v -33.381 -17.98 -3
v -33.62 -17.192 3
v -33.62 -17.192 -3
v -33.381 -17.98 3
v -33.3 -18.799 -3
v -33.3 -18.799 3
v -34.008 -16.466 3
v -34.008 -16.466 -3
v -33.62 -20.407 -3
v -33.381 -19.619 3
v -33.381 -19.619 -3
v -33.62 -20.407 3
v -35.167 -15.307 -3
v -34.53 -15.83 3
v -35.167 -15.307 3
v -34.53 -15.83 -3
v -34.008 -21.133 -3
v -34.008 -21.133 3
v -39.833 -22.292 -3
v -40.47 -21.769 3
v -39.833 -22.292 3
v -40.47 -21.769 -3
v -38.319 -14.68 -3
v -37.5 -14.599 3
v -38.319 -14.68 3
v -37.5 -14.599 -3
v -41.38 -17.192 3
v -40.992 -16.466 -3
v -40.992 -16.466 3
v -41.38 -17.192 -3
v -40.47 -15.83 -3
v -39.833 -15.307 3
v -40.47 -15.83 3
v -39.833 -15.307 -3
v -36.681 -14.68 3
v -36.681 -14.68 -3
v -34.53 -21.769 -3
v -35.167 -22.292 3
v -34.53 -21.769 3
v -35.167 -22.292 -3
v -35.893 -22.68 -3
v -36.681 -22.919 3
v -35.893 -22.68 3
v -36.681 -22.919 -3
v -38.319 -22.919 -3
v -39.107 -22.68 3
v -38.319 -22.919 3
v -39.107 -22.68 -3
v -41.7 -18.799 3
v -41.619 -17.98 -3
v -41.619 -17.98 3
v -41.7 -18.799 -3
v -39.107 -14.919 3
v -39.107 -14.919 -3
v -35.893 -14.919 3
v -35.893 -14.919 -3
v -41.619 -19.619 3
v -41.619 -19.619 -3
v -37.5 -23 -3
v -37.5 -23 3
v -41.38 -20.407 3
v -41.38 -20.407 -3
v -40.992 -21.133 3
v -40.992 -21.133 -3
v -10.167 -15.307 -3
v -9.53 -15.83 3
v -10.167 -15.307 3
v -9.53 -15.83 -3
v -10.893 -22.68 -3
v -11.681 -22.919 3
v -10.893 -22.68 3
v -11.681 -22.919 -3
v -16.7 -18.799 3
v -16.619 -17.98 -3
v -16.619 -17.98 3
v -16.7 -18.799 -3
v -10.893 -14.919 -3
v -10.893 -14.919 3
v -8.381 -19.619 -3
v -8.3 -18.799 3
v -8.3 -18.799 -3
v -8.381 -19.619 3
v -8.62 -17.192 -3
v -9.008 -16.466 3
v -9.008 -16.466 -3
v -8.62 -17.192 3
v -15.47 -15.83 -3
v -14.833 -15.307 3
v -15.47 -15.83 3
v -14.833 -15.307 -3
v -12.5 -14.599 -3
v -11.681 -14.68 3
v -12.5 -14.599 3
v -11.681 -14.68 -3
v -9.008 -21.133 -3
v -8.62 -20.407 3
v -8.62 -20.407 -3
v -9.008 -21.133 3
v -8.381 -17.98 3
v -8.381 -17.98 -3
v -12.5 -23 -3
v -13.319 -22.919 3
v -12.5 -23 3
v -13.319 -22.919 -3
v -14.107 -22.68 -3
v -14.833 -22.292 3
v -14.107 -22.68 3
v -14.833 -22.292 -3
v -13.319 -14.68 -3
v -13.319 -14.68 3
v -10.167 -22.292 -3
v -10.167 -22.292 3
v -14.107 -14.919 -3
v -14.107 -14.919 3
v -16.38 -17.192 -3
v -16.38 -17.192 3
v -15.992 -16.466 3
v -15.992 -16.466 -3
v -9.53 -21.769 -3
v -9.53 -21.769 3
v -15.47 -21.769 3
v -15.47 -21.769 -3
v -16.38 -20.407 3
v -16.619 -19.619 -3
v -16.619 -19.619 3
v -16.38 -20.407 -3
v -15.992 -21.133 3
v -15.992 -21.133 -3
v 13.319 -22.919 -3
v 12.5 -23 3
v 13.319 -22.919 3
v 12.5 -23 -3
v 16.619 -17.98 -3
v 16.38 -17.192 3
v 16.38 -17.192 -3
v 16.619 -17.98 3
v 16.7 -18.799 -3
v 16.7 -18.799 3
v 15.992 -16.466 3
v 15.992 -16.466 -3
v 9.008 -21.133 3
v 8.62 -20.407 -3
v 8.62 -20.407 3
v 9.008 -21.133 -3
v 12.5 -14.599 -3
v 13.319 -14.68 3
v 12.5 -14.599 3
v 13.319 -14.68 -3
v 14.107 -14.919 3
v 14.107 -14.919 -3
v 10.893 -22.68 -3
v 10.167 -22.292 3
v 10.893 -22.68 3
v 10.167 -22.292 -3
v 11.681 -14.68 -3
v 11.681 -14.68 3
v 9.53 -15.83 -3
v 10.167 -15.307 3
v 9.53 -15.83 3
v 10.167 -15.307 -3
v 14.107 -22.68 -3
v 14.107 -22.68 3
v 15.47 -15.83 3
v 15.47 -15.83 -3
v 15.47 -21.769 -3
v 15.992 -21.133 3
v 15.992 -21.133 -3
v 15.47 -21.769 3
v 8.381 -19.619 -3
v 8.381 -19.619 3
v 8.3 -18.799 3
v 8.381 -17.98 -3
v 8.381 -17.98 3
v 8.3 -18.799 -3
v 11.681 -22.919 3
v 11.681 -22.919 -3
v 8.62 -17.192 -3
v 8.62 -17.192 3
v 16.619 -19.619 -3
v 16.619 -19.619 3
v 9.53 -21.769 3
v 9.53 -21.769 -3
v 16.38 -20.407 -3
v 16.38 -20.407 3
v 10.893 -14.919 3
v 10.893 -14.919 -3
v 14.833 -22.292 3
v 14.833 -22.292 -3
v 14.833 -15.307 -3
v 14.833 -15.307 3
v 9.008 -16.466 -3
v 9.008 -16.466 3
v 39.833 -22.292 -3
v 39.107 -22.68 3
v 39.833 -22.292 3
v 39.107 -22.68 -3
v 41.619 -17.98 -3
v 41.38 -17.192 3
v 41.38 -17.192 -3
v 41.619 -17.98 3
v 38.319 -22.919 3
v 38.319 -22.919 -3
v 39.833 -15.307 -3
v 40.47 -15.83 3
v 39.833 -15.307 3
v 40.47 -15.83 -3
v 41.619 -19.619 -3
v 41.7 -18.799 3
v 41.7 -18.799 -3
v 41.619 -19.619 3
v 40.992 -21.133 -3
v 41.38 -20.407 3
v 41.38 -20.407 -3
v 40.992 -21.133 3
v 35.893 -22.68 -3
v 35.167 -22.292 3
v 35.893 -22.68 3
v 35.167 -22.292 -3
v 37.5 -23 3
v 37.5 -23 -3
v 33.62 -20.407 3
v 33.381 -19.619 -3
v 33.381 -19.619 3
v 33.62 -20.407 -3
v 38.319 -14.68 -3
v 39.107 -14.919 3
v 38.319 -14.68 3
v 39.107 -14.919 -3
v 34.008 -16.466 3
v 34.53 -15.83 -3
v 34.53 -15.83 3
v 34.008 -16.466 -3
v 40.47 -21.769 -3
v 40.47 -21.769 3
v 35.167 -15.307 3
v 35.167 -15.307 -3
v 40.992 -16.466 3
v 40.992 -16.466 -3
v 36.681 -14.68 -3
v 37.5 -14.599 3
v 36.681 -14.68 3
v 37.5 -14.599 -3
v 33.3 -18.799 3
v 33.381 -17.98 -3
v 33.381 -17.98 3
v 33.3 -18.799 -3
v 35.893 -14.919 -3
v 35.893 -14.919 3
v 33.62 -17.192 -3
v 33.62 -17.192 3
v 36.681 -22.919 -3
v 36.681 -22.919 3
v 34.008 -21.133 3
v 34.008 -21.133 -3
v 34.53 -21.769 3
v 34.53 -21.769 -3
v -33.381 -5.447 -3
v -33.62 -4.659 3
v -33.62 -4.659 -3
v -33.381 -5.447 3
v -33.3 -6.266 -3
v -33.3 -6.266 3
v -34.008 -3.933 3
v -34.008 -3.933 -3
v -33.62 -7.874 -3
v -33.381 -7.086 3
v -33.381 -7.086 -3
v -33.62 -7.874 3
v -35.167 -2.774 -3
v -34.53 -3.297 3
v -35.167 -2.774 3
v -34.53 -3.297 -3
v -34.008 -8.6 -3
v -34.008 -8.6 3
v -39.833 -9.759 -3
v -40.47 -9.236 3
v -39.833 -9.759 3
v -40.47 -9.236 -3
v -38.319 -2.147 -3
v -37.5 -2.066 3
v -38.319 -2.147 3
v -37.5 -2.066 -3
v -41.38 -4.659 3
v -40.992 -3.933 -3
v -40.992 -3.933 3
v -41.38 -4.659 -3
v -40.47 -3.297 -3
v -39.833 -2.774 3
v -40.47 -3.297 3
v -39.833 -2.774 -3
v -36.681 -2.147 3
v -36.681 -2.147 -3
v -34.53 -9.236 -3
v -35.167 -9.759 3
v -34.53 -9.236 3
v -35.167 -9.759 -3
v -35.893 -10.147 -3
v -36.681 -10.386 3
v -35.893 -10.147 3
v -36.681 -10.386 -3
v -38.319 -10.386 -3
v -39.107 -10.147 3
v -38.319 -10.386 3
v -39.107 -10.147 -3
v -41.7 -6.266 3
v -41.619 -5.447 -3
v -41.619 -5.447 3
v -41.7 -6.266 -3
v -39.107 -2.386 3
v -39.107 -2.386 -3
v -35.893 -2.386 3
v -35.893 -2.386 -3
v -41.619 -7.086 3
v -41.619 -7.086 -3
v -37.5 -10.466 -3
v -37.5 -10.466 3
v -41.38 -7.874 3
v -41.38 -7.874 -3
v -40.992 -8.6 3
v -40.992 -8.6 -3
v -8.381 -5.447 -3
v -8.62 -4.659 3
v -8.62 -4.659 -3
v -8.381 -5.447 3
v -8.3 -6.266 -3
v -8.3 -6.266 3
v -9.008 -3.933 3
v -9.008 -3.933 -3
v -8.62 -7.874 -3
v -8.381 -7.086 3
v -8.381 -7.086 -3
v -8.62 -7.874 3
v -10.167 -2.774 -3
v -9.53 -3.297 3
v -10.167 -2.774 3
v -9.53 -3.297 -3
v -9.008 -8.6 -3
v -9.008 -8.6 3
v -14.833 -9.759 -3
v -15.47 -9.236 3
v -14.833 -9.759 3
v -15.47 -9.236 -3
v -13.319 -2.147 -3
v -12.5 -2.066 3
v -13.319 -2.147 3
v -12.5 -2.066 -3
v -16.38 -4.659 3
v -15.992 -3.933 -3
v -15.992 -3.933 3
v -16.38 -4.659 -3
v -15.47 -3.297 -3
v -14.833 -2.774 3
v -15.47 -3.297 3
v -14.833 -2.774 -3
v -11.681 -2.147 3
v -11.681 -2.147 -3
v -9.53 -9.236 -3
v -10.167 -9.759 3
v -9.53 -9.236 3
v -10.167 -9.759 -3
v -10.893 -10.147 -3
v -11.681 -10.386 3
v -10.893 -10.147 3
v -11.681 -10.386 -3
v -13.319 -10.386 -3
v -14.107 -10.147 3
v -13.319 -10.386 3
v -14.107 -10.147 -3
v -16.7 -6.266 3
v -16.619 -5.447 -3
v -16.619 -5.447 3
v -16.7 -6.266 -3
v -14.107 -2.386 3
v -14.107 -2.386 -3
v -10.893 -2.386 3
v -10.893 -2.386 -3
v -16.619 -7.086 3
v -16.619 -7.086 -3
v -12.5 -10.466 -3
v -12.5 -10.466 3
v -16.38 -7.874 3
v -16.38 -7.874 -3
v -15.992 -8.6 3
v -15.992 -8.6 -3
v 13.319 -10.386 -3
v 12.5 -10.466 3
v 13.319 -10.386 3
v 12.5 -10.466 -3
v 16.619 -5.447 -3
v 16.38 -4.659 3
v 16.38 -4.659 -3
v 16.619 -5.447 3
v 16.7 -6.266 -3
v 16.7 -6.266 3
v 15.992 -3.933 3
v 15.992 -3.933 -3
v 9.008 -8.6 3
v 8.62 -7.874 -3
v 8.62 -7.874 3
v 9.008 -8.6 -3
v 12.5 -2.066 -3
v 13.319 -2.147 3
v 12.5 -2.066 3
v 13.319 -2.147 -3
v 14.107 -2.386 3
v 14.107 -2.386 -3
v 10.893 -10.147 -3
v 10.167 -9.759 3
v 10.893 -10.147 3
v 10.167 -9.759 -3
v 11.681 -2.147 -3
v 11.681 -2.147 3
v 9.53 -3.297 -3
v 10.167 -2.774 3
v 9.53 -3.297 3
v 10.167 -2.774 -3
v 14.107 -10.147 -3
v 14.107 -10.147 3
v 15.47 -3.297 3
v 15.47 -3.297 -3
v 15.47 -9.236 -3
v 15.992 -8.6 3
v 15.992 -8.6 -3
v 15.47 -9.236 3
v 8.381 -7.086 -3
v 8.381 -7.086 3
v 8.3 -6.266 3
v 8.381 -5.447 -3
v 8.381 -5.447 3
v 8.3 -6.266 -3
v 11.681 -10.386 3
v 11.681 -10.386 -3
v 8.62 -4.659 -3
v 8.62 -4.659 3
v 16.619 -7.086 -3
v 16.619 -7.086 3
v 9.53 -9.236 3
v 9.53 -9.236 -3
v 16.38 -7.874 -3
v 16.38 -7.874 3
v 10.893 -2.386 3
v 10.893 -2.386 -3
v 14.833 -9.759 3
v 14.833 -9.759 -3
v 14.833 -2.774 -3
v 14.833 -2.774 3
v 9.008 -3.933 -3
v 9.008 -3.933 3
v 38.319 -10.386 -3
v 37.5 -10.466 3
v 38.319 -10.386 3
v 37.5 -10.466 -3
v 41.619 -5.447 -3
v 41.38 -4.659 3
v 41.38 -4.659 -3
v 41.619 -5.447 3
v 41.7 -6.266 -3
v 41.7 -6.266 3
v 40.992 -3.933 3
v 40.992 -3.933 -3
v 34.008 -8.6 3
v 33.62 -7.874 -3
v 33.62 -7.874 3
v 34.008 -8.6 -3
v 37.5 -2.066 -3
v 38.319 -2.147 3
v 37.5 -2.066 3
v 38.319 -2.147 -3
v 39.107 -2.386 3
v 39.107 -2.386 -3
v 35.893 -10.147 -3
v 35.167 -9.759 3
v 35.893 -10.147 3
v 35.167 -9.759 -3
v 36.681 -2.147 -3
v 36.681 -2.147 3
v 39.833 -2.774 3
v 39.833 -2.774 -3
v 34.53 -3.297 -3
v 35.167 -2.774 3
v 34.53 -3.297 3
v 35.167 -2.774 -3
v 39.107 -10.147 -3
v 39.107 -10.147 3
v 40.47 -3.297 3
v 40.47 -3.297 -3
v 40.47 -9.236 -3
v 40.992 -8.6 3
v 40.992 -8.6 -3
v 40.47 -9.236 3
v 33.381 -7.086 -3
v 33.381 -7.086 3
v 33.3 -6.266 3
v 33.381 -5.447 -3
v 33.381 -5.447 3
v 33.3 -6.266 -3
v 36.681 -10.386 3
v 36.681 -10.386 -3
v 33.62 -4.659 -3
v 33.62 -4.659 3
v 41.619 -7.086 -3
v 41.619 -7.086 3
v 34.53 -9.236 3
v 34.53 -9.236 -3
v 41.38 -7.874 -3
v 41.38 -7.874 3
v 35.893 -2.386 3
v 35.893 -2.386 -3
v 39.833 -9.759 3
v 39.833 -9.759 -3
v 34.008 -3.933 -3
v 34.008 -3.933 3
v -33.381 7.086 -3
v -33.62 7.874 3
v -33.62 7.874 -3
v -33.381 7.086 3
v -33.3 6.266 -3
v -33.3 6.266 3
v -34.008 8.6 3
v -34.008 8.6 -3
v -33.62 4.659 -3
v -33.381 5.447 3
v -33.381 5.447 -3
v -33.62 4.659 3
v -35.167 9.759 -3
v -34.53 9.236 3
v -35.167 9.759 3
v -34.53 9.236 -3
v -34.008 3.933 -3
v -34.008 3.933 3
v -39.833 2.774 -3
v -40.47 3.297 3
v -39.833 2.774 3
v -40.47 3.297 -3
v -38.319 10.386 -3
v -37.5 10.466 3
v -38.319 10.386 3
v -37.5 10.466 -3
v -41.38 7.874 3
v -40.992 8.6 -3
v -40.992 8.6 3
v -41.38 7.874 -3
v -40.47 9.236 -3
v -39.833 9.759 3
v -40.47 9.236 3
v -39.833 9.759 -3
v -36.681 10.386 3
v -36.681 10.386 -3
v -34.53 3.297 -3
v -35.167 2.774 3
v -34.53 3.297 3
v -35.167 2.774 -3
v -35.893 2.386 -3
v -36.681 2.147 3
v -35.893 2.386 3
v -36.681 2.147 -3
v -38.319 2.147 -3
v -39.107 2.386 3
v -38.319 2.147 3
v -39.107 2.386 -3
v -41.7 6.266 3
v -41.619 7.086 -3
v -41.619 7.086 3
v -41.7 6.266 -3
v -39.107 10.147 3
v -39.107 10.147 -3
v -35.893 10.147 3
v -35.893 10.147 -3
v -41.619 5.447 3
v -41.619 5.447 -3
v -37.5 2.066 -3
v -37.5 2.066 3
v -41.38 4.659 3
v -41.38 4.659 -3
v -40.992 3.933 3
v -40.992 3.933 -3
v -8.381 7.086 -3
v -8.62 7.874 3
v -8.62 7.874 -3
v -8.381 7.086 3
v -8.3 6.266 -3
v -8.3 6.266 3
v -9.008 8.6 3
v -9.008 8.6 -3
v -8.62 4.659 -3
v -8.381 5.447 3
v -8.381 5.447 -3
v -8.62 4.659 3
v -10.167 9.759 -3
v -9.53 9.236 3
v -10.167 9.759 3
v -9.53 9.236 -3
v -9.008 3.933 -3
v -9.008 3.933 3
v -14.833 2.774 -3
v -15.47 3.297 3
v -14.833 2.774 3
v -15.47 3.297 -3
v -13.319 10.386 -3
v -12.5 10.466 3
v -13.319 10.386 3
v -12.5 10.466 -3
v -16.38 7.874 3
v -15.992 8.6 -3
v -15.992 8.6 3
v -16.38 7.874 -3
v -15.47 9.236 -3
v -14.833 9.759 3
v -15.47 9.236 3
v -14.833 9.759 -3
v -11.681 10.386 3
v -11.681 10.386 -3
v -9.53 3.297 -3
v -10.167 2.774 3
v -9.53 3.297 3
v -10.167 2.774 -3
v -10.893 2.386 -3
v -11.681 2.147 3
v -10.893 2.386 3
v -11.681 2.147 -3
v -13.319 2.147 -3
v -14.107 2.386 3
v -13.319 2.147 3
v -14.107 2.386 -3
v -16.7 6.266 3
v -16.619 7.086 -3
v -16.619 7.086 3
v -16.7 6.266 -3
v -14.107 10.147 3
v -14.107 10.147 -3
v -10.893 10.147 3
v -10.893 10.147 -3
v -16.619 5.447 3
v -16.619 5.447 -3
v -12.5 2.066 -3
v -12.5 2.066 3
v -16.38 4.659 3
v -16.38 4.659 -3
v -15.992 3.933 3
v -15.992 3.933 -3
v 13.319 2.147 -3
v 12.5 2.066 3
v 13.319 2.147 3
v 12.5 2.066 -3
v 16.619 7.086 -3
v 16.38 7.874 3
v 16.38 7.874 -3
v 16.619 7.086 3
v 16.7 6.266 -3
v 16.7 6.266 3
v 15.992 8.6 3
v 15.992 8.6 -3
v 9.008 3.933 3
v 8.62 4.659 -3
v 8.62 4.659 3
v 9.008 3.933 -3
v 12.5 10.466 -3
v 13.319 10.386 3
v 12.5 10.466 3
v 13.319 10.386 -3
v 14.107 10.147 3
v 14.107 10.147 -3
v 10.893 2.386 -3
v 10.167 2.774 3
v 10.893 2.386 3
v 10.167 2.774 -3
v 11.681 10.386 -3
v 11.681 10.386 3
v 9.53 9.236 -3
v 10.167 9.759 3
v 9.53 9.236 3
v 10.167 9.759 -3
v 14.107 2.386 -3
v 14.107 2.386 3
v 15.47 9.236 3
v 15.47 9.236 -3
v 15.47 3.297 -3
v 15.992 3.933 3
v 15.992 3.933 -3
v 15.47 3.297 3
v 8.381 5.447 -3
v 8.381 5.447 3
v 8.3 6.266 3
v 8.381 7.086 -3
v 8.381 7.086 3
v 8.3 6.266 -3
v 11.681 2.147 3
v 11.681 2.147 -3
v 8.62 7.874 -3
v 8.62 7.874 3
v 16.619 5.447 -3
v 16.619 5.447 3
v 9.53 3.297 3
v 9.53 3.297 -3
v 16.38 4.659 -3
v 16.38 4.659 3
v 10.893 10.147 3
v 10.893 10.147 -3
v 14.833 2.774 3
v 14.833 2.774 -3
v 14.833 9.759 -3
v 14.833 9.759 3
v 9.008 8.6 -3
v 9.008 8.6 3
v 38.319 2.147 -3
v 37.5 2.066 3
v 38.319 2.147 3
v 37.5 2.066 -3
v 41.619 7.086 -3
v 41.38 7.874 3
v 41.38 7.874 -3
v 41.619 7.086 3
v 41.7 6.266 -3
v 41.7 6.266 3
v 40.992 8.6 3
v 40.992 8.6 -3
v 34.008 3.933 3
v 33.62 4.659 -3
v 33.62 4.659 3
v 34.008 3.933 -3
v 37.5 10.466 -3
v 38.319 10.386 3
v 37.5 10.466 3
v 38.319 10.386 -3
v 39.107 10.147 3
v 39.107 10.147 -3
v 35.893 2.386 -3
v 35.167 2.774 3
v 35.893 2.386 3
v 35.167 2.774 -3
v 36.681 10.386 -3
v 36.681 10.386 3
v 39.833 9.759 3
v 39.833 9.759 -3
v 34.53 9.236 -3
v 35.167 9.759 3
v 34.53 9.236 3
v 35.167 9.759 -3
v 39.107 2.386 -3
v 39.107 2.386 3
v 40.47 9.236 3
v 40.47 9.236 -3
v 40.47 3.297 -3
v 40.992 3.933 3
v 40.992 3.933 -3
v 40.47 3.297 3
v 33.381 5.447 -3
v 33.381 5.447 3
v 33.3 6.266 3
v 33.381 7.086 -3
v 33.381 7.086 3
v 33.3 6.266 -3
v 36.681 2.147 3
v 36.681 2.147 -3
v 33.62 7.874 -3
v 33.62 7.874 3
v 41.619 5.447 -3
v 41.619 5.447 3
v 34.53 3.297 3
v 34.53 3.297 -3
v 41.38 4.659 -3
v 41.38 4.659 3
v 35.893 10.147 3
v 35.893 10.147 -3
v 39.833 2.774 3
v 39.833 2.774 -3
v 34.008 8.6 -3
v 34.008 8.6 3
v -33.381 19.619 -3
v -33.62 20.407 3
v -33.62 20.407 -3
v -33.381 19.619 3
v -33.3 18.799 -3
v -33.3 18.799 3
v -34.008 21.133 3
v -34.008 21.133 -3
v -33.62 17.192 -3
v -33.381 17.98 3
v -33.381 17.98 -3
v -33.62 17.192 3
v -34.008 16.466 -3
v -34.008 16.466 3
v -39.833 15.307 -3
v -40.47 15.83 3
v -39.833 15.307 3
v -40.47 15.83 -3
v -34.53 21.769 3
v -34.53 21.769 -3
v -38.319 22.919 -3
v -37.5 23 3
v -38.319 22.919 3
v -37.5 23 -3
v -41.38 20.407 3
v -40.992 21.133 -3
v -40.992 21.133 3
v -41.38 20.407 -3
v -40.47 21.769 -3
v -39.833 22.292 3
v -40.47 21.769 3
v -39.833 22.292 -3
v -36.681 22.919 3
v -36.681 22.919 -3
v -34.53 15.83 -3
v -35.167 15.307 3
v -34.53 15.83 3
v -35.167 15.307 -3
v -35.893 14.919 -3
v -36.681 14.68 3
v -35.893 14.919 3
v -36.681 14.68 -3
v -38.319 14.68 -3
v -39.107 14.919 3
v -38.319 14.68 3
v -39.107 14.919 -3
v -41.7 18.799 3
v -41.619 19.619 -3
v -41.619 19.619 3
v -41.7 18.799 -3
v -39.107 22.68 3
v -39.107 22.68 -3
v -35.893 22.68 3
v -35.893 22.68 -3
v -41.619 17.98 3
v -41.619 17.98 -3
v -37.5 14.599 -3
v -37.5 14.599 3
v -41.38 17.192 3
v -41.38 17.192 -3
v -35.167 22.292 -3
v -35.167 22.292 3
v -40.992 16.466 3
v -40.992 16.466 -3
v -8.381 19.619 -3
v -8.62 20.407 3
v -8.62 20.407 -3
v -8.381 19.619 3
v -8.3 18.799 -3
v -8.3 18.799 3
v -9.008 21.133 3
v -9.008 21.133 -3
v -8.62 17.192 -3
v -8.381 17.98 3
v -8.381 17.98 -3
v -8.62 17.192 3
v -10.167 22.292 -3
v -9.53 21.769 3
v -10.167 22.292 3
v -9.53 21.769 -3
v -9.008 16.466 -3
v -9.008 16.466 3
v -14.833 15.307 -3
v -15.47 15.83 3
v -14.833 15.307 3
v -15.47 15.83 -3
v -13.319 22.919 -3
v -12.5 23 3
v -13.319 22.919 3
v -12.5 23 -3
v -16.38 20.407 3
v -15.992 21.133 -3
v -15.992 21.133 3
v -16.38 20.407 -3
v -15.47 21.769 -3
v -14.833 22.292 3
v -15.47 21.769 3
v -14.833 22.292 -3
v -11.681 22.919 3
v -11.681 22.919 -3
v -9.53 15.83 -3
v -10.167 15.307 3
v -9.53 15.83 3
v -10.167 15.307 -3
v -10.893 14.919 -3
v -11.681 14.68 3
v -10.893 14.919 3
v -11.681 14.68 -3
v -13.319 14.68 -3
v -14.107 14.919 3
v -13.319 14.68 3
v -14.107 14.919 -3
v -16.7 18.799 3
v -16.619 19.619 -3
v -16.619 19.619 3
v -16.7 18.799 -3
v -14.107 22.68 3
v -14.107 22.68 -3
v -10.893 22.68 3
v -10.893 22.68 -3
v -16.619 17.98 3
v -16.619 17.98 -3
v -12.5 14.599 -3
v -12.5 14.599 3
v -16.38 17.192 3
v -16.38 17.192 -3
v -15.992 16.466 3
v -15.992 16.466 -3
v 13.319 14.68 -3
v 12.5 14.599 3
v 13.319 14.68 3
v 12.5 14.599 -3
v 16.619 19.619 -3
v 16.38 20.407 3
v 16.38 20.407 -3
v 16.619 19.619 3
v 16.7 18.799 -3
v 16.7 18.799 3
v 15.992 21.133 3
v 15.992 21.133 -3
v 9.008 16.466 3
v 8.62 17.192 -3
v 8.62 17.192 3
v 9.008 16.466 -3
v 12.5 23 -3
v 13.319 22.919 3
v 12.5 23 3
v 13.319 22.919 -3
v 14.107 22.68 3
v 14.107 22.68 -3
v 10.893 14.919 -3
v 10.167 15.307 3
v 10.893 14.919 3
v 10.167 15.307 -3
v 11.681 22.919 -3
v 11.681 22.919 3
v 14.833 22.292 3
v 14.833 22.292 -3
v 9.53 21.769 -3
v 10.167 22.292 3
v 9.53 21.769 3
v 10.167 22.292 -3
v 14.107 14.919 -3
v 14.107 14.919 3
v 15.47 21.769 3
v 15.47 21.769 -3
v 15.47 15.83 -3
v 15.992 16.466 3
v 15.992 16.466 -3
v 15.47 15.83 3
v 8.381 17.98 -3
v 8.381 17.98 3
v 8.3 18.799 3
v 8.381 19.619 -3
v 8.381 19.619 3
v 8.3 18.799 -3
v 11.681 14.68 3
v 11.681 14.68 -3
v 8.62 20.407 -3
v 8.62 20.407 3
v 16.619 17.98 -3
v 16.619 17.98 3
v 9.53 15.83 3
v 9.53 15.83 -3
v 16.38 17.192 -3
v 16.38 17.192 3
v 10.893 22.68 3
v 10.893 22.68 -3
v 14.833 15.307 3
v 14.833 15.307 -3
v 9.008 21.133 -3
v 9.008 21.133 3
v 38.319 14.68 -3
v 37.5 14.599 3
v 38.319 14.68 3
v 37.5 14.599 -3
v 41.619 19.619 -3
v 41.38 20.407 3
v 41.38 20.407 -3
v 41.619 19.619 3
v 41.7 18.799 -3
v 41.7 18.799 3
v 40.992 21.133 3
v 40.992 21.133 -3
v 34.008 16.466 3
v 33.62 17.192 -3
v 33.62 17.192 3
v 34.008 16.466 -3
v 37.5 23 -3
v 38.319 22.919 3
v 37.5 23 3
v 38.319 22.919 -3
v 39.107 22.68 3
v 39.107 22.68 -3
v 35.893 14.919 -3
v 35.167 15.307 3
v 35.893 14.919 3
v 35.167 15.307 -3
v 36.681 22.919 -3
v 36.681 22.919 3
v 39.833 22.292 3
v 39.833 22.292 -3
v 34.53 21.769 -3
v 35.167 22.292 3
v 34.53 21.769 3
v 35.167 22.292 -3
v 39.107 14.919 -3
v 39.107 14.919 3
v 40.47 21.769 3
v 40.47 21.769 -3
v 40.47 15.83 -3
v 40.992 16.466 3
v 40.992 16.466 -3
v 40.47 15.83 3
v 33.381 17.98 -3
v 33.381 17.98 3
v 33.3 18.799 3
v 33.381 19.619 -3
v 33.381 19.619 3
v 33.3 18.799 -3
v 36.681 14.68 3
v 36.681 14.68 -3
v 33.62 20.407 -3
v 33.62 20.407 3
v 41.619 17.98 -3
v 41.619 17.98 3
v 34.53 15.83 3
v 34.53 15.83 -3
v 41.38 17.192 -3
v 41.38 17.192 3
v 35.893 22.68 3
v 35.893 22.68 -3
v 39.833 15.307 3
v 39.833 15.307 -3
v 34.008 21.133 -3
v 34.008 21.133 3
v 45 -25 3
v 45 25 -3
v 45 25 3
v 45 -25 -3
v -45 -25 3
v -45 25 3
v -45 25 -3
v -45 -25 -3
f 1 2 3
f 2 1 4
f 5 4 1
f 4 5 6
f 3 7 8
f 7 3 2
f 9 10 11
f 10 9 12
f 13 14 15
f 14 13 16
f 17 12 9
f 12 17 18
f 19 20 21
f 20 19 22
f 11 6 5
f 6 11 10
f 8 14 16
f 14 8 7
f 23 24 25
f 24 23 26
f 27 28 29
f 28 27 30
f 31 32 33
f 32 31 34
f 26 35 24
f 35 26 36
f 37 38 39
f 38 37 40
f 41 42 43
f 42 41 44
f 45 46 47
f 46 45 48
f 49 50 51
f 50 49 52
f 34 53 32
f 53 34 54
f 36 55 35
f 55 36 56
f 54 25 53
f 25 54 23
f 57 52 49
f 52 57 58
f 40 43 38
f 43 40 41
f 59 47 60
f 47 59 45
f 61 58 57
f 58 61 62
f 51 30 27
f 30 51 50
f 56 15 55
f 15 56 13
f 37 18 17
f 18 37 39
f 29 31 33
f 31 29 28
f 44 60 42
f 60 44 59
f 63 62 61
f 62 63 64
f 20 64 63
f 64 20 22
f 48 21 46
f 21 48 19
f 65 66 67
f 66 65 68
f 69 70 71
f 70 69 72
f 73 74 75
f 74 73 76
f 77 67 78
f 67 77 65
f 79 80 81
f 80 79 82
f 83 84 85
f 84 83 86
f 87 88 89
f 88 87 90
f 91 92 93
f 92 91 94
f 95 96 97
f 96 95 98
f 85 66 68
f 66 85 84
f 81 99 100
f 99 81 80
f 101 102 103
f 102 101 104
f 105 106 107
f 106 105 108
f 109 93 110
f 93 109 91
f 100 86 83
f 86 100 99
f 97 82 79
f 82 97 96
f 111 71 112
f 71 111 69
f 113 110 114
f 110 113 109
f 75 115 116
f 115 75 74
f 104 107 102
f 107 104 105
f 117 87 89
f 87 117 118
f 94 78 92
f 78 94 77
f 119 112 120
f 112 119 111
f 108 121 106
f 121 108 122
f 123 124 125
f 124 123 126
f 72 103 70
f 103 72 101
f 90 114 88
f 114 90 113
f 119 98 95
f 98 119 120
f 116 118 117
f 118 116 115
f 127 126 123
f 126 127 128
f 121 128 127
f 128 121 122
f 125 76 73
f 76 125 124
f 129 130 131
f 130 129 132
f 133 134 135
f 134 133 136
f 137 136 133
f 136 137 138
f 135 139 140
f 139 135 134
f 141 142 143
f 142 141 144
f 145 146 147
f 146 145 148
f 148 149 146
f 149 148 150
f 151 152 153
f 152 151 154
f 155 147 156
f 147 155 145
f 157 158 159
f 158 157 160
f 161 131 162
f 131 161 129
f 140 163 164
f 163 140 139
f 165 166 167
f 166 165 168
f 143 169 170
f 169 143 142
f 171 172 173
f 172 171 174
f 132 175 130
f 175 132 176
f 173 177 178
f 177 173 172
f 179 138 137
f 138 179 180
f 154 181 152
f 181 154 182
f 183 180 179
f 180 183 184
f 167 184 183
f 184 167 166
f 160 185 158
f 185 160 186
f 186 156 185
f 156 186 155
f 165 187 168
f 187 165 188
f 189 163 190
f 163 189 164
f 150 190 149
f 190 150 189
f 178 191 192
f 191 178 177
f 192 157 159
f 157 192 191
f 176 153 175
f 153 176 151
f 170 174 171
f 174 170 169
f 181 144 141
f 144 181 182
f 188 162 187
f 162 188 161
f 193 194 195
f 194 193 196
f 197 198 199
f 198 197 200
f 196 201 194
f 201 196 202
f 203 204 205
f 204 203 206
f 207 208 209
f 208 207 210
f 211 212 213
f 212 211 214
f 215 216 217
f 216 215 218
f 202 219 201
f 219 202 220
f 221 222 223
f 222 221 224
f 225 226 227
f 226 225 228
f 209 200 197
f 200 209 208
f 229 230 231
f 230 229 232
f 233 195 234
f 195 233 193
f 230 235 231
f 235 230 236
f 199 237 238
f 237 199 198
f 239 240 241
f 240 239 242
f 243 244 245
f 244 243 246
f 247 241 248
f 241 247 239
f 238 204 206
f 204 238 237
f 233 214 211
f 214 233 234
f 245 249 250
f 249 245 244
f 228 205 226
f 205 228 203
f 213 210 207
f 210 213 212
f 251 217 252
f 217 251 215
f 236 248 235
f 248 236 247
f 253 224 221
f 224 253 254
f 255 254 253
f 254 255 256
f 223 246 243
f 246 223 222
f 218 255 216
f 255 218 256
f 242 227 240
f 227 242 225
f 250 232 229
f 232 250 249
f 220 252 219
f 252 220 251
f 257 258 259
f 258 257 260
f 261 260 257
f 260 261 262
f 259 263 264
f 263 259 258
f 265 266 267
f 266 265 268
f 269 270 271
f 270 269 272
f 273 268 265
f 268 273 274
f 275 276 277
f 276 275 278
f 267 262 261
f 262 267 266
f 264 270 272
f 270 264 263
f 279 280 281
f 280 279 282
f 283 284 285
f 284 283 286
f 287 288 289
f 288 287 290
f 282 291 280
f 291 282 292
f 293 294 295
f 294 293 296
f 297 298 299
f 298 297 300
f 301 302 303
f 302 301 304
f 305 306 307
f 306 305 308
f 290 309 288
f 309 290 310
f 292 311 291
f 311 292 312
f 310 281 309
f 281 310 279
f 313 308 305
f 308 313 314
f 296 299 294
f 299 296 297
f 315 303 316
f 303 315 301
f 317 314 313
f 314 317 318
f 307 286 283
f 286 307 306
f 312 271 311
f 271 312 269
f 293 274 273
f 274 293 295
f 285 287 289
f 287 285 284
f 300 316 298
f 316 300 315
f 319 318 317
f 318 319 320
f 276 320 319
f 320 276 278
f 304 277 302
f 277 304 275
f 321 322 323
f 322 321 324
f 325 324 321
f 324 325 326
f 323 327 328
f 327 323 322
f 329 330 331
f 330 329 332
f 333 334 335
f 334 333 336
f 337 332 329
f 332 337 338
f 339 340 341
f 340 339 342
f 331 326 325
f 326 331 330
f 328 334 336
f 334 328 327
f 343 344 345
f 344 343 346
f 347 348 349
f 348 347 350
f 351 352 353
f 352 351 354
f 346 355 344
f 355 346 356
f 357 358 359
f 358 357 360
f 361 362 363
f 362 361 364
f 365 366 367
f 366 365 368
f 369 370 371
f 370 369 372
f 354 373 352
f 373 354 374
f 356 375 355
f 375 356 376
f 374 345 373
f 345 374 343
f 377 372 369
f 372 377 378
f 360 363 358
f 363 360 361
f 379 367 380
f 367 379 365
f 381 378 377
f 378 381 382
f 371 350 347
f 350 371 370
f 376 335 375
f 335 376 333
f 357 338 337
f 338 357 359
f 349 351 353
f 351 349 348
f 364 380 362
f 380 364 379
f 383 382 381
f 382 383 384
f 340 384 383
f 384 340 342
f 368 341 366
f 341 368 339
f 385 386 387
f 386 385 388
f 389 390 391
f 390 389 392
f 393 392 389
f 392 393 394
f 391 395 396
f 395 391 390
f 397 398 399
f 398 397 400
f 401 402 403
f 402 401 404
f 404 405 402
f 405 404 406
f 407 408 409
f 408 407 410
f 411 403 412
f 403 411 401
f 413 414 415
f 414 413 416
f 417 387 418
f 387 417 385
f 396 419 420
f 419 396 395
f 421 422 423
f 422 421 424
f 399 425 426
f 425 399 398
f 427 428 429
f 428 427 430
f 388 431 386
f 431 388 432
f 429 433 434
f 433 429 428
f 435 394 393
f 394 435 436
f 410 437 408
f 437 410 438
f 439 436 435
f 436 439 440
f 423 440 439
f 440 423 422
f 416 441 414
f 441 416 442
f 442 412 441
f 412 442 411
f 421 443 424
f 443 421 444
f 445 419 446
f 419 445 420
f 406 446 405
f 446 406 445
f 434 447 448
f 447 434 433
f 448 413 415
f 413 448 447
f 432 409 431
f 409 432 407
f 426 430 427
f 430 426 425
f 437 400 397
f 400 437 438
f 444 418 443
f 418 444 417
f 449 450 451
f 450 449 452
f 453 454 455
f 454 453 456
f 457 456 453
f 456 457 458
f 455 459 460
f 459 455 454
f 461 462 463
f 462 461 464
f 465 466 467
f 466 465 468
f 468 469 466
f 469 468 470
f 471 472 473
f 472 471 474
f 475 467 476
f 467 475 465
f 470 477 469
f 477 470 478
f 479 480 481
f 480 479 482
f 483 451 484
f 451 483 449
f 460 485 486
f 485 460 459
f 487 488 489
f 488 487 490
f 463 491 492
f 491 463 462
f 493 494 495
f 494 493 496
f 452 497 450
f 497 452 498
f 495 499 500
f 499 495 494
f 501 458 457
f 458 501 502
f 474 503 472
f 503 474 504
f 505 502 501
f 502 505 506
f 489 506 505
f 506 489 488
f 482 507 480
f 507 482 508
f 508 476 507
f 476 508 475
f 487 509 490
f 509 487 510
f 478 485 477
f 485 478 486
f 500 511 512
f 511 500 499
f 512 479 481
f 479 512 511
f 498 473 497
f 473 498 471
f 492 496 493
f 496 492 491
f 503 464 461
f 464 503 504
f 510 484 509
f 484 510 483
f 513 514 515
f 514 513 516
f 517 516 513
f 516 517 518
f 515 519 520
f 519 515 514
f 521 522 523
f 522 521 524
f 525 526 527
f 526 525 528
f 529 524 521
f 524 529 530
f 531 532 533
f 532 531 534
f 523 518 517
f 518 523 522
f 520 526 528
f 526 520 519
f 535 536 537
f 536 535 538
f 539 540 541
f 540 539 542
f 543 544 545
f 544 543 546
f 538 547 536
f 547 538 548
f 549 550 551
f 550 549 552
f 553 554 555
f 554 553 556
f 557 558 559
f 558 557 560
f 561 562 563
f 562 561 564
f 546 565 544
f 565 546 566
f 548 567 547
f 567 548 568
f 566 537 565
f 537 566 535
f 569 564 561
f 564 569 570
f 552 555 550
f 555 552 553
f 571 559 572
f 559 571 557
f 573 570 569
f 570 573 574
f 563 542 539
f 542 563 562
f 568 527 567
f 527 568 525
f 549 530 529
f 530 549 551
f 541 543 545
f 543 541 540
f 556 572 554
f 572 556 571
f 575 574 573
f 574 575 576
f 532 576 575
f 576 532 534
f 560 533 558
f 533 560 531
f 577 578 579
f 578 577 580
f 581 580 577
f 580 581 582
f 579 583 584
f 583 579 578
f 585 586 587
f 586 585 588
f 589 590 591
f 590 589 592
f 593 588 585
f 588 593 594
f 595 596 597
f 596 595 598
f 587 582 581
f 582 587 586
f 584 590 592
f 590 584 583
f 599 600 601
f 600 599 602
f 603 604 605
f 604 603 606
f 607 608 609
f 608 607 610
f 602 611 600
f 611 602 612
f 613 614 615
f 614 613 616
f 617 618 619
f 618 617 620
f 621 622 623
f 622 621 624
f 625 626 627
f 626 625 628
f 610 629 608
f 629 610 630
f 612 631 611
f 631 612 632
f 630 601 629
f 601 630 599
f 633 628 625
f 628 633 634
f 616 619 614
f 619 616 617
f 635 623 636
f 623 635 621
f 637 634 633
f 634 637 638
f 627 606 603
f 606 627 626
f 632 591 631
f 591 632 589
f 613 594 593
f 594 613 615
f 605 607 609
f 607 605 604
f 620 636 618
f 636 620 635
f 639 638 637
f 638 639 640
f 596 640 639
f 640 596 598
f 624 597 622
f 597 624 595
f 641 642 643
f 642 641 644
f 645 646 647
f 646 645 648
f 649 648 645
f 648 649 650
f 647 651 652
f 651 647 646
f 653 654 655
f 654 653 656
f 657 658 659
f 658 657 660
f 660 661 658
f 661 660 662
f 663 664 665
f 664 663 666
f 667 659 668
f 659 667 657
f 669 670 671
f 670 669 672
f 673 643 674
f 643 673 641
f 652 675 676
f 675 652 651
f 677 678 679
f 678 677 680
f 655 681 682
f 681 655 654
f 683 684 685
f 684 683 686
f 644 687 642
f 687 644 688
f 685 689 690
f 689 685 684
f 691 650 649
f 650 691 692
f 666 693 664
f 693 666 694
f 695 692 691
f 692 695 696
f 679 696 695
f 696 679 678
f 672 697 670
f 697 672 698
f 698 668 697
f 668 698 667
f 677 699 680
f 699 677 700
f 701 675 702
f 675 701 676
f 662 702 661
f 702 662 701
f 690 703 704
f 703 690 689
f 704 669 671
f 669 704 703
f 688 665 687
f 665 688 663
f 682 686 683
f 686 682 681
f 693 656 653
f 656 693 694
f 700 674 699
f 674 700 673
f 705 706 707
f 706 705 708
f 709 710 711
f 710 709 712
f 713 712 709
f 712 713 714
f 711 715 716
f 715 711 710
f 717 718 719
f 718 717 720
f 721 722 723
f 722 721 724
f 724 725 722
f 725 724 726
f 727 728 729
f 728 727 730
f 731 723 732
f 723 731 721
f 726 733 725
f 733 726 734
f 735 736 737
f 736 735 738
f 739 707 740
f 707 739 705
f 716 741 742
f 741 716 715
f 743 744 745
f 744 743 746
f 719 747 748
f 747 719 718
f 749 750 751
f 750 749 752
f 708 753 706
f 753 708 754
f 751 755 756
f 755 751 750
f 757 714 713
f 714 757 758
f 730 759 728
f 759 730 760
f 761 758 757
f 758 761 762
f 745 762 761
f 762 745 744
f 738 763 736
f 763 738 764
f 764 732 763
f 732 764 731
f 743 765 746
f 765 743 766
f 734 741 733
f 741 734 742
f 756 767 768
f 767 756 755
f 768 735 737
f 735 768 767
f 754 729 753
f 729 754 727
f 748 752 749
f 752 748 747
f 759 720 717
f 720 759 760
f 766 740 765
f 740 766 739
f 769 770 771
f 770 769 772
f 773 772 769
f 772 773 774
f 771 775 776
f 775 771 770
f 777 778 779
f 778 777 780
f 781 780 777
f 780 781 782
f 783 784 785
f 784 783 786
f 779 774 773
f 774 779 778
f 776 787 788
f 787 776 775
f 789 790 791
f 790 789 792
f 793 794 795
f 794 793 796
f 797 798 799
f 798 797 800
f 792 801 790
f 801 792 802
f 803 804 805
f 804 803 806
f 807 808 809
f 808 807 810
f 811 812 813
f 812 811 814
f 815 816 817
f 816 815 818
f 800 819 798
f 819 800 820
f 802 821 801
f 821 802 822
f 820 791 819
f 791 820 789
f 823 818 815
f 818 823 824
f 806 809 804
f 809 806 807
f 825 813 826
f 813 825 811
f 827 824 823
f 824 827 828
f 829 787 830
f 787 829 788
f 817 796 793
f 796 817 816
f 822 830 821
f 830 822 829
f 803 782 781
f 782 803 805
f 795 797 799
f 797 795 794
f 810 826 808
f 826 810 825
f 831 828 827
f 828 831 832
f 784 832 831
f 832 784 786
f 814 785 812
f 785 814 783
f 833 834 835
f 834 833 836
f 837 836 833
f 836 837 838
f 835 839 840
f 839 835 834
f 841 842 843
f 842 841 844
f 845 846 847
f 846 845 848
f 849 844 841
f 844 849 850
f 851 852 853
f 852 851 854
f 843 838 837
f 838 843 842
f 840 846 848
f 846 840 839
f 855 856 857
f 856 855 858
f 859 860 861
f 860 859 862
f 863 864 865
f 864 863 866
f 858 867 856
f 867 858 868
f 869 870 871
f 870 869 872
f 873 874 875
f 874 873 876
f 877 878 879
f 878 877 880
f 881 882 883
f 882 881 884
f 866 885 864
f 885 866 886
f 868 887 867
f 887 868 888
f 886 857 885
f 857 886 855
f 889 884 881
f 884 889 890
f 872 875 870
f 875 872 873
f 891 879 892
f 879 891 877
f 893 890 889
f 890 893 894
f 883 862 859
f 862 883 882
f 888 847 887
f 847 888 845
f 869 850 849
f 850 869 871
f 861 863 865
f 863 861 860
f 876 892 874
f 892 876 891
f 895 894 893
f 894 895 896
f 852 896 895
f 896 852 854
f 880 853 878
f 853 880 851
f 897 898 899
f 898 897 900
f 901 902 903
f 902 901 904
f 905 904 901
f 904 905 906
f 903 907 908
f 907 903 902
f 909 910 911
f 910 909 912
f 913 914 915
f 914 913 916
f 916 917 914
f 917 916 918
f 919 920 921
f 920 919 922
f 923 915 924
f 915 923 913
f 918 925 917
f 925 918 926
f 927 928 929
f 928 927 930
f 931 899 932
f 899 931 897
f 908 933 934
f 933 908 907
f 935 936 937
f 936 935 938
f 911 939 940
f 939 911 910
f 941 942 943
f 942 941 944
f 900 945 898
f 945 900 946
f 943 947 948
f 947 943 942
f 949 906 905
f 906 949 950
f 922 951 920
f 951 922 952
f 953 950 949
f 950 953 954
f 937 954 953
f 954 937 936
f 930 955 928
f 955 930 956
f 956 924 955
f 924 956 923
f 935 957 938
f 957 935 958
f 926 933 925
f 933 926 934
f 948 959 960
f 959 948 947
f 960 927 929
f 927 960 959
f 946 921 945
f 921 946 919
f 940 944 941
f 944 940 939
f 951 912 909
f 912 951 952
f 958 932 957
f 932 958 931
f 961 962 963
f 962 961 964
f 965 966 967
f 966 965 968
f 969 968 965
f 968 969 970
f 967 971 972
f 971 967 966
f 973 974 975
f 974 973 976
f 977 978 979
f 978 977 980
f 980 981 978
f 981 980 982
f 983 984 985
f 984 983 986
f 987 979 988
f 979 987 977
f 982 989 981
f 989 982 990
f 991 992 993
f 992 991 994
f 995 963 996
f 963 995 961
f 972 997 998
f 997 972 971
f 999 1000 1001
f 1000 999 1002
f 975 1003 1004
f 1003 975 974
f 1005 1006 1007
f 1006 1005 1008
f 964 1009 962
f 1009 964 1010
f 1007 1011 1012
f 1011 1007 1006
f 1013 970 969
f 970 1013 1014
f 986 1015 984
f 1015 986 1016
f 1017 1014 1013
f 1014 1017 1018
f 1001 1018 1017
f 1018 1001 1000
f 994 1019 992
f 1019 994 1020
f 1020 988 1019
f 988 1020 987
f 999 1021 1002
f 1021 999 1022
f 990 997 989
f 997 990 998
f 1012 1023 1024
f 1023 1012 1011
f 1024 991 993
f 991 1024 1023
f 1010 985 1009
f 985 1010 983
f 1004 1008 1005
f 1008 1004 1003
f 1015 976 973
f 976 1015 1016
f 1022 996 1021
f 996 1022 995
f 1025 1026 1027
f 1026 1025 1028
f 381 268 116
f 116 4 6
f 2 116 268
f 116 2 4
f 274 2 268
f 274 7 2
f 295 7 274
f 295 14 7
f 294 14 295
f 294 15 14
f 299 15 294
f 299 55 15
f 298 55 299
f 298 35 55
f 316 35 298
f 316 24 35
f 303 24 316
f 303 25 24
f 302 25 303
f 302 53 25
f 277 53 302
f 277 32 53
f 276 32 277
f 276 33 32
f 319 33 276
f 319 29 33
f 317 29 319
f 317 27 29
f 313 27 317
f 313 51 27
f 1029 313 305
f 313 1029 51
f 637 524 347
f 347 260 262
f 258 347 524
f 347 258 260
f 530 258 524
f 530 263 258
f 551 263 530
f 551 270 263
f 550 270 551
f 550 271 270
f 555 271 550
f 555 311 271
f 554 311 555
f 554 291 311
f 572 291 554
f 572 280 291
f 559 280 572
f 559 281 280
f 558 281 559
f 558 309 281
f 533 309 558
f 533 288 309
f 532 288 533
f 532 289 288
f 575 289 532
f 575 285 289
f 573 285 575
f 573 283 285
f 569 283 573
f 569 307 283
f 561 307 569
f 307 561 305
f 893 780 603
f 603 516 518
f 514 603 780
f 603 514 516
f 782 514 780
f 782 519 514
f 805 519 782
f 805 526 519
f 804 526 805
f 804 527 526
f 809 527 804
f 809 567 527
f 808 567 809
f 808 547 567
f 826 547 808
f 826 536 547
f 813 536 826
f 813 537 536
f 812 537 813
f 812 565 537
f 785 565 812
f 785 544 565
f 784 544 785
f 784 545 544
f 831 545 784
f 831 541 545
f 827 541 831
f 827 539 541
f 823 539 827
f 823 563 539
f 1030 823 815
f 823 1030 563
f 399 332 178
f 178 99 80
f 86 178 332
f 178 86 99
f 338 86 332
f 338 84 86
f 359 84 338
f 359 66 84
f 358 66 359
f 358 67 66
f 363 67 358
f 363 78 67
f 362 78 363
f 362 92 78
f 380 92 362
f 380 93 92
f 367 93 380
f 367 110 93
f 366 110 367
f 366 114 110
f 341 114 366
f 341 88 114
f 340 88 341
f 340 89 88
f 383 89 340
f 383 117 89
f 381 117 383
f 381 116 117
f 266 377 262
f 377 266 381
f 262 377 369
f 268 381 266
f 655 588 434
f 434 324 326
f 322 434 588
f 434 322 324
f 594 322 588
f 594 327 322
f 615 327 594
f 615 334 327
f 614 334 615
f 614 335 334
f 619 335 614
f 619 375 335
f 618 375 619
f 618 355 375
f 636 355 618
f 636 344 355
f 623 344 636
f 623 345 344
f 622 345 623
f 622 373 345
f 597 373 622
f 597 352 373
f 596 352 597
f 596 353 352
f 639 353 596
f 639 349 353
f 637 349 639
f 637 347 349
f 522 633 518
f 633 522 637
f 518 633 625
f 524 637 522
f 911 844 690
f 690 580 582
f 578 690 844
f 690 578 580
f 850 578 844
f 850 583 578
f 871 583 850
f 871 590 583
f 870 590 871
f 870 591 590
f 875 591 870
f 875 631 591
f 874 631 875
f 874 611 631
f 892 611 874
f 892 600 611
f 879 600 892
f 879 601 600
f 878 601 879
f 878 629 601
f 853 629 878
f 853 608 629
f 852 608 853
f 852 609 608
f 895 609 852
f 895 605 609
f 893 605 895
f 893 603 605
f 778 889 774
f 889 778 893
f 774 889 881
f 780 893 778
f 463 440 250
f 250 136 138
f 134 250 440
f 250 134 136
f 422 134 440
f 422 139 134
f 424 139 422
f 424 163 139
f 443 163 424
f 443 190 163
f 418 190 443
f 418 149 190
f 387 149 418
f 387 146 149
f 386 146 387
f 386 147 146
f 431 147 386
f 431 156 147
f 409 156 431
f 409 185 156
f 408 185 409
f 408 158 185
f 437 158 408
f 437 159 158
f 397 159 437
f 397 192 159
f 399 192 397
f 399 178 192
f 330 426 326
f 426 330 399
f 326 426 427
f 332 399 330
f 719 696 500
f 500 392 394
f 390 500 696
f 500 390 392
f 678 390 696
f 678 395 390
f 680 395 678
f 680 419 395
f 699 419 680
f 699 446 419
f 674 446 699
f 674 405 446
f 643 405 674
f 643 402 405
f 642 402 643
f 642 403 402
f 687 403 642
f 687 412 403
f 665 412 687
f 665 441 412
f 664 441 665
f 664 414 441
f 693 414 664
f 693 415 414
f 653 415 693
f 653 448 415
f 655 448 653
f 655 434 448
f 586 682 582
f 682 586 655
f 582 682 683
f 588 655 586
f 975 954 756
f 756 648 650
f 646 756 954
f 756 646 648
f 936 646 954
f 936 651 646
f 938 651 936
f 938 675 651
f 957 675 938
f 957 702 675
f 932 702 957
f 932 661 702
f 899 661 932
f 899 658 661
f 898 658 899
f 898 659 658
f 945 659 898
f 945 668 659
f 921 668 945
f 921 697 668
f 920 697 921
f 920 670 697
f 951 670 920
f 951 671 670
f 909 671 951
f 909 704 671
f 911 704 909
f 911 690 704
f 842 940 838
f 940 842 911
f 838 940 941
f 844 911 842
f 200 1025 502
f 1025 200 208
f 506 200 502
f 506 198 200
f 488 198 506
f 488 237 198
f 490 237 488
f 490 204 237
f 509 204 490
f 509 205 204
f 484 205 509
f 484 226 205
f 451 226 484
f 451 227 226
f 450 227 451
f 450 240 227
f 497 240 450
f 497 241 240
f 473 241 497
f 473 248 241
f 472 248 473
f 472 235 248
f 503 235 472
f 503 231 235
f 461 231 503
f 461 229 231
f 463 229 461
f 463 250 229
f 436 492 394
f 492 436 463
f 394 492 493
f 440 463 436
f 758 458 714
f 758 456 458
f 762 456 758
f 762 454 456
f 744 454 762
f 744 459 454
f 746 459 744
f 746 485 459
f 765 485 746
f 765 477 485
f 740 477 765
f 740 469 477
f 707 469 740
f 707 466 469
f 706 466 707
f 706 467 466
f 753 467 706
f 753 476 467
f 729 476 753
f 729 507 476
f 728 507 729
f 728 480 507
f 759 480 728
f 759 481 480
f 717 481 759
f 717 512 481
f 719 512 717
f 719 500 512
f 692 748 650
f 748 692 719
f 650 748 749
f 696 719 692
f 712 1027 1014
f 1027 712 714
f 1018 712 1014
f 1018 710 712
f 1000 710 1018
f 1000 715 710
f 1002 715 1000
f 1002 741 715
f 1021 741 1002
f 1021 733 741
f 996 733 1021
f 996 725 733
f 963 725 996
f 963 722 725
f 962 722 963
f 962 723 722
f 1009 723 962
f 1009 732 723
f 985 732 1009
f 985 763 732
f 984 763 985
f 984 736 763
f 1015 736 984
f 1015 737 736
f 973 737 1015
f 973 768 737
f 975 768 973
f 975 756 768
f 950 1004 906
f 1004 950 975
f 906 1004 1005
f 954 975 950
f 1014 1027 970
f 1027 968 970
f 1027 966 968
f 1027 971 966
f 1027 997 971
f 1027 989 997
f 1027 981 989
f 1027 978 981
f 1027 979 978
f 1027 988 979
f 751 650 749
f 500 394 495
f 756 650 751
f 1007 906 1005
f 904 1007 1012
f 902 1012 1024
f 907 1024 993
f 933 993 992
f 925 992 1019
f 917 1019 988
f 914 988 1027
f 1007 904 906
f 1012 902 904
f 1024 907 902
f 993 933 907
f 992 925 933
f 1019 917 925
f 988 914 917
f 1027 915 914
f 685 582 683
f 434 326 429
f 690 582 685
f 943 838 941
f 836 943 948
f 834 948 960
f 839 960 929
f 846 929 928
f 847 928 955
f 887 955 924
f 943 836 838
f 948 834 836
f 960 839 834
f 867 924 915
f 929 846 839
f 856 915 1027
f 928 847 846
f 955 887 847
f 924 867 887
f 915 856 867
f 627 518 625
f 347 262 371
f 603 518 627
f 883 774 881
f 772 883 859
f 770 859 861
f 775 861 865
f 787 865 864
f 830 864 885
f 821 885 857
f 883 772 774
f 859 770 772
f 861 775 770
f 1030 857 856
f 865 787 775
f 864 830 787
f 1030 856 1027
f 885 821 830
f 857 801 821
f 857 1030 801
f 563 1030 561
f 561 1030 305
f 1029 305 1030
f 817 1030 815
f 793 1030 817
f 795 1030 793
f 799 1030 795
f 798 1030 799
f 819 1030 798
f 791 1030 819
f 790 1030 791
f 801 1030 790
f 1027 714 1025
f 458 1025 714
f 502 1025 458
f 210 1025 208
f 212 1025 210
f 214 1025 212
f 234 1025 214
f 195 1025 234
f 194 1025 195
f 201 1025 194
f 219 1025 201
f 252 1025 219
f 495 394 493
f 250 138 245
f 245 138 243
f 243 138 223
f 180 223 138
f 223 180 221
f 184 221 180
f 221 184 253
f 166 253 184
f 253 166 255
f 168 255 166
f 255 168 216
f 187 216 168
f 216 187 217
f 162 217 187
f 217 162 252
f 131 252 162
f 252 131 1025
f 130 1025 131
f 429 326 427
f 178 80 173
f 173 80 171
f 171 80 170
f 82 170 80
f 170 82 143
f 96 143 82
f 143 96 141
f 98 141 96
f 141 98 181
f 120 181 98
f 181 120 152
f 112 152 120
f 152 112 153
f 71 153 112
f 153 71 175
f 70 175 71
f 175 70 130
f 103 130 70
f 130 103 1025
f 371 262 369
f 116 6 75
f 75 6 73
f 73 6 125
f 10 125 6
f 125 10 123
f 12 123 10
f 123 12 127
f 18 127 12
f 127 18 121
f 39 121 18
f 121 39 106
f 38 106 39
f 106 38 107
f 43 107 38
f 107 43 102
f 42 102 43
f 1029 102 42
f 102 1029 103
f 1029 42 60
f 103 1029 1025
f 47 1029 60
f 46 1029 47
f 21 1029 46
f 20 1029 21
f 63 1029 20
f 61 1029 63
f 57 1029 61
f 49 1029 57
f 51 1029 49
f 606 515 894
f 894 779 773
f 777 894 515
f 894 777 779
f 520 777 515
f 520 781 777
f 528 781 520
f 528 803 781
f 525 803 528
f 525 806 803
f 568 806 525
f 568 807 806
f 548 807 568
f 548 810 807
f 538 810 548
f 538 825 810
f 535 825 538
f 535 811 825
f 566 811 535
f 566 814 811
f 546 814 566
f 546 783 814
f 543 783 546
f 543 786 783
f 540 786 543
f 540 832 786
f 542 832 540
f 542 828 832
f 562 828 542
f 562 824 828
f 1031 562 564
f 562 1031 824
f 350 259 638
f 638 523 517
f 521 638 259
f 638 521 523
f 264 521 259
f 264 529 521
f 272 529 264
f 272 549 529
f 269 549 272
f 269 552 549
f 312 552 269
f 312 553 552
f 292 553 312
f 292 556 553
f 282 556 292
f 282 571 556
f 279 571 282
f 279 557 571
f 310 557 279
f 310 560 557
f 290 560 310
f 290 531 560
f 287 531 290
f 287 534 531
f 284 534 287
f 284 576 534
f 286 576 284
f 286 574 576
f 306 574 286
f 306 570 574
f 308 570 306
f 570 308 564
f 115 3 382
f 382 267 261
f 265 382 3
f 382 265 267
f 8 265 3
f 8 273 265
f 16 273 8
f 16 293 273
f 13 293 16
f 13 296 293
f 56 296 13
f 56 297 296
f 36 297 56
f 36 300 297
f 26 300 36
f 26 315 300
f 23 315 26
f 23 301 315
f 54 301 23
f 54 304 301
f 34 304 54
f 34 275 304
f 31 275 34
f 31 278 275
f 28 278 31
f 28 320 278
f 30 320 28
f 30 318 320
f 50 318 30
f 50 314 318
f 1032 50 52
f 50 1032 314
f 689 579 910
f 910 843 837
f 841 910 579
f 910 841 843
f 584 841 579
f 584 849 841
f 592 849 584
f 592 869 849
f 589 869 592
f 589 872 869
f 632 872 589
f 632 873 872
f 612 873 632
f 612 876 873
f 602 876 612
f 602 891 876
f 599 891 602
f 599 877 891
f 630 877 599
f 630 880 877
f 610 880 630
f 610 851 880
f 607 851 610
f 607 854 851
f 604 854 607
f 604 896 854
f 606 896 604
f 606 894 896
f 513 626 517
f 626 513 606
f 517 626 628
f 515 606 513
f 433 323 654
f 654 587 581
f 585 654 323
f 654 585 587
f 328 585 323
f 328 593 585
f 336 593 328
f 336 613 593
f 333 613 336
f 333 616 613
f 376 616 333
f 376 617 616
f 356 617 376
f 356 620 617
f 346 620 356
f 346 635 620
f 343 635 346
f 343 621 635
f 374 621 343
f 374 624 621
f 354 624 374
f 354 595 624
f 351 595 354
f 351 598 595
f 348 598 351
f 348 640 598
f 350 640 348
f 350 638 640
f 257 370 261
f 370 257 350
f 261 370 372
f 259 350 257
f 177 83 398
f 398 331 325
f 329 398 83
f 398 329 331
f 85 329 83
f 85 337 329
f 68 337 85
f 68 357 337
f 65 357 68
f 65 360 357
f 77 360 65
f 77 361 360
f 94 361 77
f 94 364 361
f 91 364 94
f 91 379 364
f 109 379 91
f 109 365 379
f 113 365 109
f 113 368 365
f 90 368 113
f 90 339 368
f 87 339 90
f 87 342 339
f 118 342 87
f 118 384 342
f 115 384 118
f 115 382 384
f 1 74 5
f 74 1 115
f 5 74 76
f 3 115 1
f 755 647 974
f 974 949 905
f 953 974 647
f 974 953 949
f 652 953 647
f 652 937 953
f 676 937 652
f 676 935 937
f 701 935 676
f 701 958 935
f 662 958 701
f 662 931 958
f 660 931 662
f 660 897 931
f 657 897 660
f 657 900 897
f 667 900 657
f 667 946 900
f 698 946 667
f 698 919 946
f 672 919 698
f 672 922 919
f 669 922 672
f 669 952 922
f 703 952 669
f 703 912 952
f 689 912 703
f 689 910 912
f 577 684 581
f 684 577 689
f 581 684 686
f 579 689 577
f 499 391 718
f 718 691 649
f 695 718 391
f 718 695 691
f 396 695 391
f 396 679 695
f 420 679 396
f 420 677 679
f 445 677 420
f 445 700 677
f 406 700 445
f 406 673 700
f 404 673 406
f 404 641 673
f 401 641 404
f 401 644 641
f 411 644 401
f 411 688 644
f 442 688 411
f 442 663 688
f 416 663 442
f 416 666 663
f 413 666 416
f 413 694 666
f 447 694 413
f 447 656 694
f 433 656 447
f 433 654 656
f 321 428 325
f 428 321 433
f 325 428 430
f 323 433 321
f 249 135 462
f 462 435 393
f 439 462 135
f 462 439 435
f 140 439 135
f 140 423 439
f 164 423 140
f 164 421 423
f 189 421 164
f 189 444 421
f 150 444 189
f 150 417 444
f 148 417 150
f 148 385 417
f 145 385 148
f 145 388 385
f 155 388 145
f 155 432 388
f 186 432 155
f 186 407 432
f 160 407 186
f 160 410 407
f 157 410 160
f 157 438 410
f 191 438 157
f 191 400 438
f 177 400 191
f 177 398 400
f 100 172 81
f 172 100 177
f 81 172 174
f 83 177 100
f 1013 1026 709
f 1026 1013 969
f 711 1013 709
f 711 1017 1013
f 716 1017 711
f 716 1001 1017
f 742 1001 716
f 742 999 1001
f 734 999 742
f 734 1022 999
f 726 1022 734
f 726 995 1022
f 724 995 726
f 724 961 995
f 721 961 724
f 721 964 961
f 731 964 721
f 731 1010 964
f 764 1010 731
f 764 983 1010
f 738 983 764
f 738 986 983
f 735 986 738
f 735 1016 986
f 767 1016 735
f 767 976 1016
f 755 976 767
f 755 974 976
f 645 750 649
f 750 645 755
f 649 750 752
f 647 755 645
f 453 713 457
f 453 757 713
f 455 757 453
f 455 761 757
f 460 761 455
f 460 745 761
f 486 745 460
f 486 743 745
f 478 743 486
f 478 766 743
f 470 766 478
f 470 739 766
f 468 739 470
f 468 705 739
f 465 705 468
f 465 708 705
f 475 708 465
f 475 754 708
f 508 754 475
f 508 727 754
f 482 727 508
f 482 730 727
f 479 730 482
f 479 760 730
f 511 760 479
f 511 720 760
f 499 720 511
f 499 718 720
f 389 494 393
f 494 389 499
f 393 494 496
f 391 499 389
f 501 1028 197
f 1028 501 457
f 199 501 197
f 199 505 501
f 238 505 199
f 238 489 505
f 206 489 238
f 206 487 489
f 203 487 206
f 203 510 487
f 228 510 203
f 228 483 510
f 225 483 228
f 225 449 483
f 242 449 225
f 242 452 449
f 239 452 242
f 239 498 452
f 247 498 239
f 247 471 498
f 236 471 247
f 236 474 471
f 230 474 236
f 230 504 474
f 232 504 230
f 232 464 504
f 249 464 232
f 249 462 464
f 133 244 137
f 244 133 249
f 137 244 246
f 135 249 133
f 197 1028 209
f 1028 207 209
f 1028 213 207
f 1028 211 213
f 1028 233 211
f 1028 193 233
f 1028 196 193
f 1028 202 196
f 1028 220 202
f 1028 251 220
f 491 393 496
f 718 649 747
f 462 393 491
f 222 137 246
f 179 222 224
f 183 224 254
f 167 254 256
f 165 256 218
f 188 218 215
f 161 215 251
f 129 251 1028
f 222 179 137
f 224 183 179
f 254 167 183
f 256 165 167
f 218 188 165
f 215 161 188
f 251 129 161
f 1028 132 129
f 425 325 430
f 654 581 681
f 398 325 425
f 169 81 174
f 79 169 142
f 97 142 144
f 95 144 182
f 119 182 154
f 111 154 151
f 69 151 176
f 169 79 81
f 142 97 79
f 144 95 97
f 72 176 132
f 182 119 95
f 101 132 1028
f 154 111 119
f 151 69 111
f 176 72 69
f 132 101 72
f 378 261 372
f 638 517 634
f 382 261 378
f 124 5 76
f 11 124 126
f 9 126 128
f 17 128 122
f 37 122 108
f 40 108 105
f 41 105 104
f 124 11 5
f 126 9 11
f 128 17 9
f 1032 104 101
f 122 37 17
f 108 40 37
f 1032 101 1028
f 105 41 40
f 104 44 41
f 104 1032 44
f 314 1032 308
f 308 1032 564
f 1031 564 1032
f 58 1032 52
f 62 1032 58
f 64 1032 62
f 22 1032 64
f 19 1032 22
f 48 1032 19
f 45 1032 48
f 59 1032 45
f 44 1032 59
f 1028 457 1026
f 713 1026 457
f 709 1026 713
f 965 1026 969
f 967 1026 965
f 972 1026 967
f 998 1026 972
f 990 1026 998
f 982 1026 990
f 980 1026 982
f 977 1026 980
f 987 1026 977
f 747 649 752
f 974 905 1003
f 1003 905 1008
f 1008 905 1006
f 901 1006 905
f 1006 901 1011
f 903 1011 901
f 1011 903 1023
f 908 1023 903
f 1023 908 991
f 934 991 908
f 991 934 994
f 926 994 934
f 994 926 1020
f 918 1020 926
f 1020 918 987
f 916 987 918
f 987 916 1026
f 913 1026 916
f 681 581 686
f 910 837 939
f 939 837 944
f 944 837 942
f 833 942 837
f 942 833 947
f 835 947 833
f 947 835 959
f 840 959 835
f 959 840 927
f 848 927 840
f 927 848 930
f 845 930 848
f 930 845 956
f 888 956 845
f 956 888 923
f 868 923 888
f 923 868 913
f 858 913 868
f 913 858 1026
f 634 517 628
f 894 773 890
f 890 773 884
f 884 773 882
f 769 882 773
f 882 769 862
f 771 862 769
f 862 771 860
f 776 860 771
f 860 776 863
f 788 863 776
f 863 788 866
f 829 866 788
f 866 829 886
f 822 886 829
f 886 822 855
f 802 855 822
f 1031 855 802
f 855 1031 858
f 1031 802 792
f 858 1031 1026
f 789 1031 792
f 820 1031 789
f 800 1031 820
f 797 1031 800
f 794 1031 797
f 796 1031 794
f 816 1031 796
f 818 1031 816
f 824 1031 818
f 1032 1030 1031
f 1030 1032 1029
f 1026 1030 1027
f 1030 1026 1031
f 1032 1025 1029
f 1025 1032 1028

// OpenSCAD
$fn = 32;

// ----------------------------------------------------------------------
// Perforated panel 90 x 50 x 6
// 4 x 4 Ø8.4 holes, grid layout
// ----------------------------------------------------------------------

// --- parameters (mm) ---
panel = [90, 50, 6];  // overall size (x, y, z)
hole_d = 8.4;         // hole diameter
pitch_x = 25;         // hole pitch along X
pitch_y = 12.533;     // hole pitch along Y

// --- derived feature positions (mm) ---
margin = hole_d / 2 + 2;            // = 6.2   clearance from the panel edge
cols = floor((panel[0] - 2 * margin) / pitch_x) + 1;  // = 4   how many columns fit in X
rows = floor((panel[1] - 2 * margin) / pitch_y) + 1;  // = 4   how many rows fit in Y
span_x = (cols - 1) * pitch_x + 0;  // = 75   width of the field
span_y = (rows - 1) * pitch_y;      // = 37.6   height of the field
origin_x = -span_x / 2;             // = -37.5   X of the first hole
origin_y = -span_y / 2;             // = -18.8   Y of the first row
holes = rows * cols;                // = 16   holes in total
feature_centers = [
  [origin_x + 0 * pitch_x, origin_y + 0 * pitch_y],
  [origin_x + 1 * pitch_x, origin_y + 0 * pitch_y],
  [origin_x + 2 * pitch_x, origin_y + 0 * pitch_y],
  [origin_x + 3 * pitch_x, origin_y + 0 * pitch_y],
  [origin_x + 0 * pitch_x, origin_y + 1 * pitch_y],
  [origin_x + 1 * pitch_x, origin_y + 1 * pitch_y],
  [origin_x + 2 * pitch_x, origin_y + 1 * pitch_y],
  [origin_x + 3 * pitch_x, origin_y + 1 * pitch_y],
  [origin_x + 0 * pitch_x, origin_y + 2 * pitch_y],
  [origin_x + 1 * pitch_x, origin_y + 2 * pitch_y],
  [origin_x + 2 * pitch_x, origin_y + 2 * pitch_y],
  [origin_x + 3 * pitch_x, origin_y + 2 * pitch_y],
  [origin_x + 0 * pitch_x, origin_y + 3 * pitch_y],
  [origin_x + 1 * pitch_x, origin_y + 3 * pitch_y],
  [origin_x + 2 * pitch_x, origin_y + 3 * pitch_y],
  [origin_x + 3 * pitch_x, origin_y + 3 * pitch_y]
];   // hole centres, used verbatim by the cutter loop

// panel outline, every hole through
difference() {
  cube(panel, center = true);
  for (centre = feature_centers)
    translate([centre[0], centre[1], 0])
      cylinder(d = hole_d, h = panel[2] + 2, center = true);
}
